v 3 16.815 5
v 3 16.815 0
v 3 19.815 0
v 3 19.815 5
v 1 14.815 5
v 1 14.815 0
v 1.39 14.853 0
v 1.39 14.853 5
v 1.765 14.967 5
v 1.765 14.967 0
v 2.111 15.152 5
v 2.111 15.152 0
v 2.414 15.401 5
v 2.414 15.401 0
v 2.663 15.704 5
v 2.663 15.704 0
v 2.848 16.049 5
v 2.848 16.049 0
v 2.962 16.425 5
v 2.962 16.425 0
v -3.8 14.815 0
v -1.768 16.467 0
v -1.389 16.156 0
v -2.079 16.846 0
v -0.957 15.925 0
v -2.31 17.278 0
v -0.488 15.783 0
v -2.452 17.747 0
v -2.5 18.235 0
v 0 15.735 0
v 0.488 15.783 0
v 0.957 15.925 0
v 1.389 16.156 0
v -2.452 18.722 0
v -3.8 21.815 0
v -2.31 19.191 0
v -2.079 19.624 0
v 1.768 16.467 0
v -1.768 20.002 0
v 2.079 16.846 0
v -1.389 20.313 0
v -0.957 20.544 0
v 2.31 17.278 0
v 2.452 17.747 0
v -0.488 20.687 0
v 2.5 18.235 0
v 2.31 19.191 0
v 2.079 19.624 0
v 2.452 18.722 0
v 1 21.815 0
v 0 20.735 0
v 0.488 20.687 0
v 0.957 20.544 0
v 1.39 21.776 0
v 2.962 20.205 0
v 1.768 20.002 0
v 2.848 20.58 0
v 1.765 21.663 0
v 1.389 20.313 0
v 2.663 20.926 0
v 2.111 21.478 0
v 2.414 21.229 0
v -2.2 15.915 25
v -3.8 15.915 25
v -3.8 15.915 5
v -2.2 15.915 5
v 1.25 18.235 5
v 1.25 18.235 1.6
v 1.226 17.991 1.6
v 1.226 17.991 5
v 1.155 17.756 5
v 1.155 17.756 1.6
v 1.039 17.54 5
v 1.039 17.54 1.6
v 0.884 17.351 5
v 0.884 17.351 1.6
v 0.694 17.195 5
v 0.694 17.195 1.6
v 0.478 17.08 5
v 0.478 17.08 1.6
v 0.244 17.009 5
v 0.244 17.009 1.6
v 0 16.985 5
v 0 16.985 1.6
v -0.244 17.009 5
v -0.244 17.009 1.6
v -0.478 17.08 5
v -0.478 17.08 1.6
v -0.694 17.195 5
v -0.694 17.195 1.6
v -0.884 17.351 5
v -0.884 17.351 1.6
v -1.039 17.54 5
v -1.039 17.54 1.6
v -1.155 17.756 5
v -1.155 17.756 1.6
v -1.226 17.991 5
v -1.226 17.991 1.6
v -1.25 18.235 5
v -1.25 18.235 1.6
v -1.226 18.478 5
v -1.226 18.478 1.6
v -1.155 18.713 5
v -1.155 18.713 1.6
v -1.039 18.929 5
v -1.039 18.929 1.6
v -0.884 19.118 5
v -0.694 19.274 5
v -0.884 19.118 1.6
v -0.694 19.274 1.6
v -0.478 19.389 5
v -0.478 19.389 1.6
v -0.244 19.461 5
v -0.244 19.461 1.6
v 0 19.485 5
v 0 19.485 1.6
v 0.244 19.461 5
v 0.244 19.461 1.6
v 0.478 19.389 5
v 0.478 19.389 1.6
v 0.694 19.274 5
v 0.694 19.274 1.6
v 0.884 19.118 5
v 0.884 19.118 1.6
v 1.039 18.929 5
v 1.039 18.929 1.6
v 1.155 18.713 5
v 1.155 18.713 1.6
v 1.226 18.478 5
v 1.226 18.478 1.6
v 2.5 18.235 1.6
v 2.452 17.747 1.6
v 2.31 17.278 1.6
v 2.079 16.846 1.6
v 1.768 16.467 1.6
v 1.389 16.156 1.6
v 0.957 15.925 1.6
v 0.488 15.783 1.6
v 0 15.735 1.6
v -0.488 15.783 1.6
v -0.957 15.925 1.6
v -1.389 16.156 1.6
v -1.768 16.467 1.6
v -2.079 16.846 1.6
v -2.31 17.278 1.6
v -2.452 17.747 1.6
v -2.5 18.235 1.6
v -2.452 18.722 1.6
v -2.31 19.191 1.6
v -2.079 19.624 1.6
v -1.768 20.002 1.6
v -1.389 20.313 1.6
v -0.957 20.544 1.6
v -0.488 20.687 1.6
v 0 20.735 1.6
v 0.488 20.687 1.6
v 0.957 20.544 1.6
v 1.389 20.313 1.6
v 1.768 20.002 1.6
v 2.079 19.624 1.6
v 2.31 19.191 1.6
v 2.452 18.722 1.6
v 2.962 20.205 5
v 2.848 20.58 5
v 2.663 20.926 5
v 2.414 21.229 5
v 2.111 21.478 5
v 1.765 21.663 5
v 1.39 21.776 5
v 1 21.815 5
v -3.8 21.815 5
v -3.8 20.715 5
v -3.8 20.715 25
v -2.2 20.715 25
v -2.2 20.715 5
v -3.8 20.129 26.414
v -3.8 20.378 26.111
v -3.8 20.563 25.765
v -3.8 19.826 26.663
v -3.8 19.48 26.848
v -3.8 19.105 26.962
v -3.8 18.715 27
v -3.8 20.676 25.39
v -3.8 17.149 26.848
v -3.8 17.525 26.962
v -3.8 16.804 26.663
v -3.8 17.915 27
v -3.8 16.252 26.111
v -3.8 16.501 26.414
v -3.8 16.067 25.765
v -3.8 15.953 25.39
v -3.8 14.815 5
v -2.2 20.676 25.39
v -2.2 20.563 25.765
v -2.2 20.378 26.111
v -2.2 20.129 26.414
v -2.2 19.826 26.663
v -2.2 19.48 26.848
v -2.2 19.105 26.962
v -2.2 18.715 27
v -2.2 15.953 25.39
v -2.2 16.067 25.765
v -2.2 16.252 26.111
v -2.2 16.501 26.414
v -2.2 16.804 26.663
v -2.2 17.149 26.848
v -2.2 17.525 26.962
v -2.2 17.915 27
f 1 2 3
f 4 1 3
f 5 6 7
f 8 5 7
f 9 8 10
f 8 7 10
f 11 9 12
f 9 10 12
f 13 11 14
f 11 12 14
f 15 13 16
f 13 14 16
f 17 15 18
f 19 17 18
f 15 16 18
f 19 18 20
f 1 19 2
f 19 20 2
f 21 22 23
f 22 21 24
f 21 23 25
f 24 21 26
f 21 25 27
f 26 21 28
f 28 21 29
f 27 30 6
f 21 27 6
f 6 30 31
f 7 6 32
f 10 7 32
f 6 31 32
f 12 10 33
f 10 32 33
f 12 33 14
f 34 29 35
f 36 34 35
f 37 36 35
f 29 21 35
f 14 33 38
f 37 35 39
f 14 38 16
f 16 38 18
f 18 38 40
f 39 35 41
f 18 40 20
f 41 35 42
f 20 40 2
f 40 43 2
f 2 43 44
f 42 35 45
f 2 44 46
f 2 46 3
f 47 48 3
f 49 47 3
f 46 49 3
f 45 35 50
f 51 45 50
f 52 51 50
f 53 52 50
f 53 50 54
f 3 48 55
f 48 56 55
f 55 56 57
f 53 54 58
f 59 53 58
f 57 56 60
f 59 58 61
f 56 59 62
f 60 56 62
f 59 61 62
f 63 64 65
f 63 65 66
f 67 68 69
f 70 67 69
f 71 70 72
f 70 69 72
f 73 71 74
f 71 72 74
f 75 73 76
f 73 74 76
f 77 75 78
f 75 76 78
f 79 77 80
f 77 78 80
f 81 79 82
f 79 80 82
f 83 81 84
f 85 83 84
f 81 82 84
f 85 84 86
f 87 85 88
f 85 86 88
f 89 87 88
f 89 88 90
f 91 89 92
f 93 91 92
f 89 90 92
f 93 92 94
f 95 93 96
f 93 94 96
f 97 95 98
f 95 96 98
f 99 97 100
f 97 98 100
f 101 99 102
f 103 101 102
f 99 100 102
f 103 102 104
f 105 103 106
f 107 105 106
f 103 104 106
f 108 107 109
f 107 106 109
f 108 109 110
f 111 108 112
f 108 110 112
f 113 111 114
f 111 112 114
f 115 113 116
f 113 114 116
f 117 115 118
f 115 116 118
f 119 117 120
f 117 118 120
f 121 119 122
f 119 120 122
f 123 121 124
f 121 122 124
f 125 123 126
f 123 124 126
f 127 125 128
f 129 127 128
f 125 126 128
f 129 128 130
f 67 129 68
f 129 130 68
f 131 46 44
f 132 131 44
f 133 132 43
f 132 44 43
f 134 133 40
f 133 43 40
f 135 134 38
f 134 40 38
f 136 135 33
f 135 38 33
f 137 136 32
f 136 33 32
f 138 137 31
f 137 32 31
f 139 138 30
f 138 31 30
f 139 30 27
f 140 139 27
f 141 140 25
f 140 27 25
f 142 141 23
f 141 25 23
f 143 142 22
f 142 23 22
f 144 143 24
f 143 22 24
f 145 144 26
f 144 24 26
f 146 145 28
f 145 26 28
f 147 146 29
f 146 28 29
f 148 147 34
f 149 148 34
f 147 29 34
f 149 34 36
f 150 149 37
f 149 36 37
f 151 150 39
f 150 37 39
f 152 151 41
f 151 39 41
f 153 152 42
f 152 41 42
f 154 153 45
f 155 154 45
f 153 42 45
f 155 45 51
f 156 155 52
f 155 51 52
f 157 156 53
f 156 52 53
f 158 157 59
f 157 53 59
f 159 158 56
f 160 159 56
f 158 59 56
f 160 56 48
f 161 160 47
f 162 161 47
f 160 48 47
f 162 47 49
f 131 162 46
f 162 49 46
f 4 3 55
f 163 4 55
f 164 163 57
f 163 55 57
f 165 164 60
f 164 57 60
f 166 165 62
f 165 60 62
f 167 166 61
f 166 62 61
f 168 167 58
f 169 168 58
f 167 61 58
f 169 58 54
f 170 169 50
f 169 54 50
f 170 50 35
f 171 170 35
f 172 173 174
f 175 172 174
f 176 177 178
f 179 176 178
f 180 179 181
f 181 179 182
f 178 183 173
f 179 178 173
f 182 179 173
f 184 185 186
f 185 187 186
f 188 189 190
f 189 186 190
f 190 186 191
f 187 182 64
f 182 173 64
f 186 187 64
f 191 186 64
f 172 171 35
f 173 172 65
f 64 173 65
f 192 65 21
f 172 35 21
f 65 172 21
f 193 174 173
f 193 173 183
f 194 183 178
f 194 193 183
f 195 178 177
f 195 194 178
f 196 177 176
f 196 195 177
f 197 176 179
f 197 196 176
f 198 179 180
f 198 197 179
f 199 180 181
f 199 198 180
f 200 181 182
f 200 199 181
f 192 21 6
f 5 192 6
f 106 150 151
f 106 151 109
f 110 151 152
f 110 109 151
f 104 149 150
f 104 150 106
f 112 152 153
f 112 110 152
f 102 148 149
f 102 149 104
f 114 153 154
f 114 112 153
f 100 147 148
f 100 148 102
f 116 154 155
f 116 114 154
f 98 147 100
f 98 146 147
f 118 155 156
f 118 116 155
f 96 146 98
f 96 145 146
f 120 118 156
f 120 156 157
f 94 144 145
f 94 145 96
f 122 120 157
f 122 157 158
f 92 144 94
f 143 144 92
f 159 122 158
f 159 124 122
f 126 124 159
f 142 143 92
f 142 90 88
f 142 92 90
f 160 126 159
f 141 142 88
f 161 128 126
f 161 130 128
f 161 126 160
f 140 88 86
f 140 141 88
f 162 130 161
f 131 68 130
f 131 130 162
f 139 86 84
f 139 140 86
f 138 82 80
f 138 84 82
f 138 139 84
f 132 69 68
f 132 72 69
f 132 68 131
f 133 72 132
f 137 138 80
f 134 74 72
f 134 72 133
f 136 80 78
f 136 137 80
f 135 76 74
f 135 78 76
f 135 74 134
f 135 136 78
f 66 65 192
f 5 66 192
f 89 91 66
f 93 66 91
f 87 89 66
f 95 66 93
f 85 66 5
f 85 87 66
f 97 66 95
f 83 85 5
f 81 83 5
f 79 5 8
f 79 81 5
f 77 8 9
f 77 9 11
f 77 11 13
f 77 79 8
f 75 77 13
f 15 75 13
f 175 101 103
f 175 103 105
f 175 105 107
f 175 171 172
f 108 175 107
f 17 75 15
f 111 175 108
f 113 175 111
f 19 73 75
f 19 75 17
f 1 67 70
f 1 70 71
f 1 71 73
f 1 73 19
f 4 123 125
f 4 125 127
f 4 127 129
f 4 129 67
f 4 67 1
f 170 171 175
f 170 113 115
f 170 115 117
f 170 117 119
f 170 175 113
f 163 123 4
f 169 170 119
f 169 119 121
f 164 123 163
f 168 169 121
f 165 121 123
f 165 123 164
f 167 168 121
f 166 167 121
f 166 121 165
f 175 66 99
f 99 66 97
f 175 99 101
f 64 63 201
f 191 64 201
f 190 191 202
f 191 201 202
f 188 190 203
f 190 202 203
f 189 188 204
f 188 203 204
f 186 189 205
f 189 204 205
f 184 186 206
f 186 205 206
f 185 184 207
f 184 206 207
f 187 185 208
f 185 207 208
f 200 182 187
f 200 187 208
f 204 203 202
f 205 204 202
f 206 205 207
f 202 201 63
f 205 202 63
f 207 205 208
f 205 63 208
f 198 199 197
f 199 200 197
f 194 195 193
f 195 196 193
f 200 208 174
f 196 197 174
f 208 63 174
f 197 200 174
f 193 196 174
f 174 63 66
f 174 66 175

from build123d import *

# Parameters (mm, degrees)
F1_DEPTH  = 5
F2_R      = 2.5
F3_DEPTH  = 1.6
F4_R      = 1.25
F5_DEPTH  = 3.4
F6_W      = 2
F6_H      = 4.8
F7_DEPTH  = 22
F8_R      = 2
F9_DEPTH  = 0.2
F10_DEPTH = 0.2


# Not quite as in the source:
# - a feature names something its author has since deleted; it is built from what else it names


with BuildPart() as f1:
    # F0 (on Top) → F1 (new body)
    with BuildSketch(Plane.XY):
        with BuildLine():
            Line((1, 21.8148477226), (-4, 21.8148477226))
            Line((-4, 21.8148477226), (-4, 14.8148477226))
            Line((-4, 14.8148477226), (1, 14.8148477226))
            ThreePointArc((1, 14.8148477226), (2.4142135624, 15.4006341603), (3, 16.8148477226))
            Line((3, 16.8148477226), (3, 19.8148477226))
            ThreePointArc((3, 19.8148477226), (2.4142135624, 21.229061285), (1, 21.8148477226))
        make_face()
    extrude(amount=F1_DEPTH)

    # F2 (on face) → F3 (cut)
    with BuildSketch(Plane(origin=(0, 0, 0), x_dir=(1, 0, 0), z_dir=(0, 0, -1))):
        with Locations((0, -18.2346012443)):
            Circle(F2_R)
    extrude(amount=-F3_DEPTH, mode=Mode.SUBTRACT)

    # F4 (on face) → F5 (cut)
    with BuildSketch(Plane(origin=(0, 0, 1.6), x_dir=(1, 0, 0), z_dir=(0, 0, -1))):
        with Locations((0, -18.2346012443)):
            Circle(F4_R)
    extrude(amount=-F5_DEPTH, mode=Mode.SUBTRACT)

    # F6 (on face) → F7 (join)
    with BuildSketch(Plane.XY.offset(5)):
        with Locations((-3, 18.3148477226)):
            Rectangle(F6_W, F6_H)
    extrude(amount=F7_DEPTH)

    # F8
    f8_edges = [f1.edges().sort_by_distance(p)[0] for p in [
        (-3, 20.714848, 27),
        (-3, 15.914848, 27),
    ]]
    fillet(f8_edges, radius=F8_R)

    # F9 (cut): a face of the model
    f9_faces = [f1.faces().sort_by_distance(p)[0] for p in [
        (-2, 18.3148477226, 15.8255925745),
    ]]
    extrude(f9_faces, amount=-F9_DEPTH, mode=Mode.SUBTRACT)

    # F10 (cut): a face of the model
    f10_faces = [f1.faces().sort_by_distance(p)[0] for p in [
        (-4, 18.3148477226, 12.4674053391),
    ]]
    extrude(f10_faces, amount=-F10_DEPTH, mode=Mode.SUBTRACT)


solid = f1.part
